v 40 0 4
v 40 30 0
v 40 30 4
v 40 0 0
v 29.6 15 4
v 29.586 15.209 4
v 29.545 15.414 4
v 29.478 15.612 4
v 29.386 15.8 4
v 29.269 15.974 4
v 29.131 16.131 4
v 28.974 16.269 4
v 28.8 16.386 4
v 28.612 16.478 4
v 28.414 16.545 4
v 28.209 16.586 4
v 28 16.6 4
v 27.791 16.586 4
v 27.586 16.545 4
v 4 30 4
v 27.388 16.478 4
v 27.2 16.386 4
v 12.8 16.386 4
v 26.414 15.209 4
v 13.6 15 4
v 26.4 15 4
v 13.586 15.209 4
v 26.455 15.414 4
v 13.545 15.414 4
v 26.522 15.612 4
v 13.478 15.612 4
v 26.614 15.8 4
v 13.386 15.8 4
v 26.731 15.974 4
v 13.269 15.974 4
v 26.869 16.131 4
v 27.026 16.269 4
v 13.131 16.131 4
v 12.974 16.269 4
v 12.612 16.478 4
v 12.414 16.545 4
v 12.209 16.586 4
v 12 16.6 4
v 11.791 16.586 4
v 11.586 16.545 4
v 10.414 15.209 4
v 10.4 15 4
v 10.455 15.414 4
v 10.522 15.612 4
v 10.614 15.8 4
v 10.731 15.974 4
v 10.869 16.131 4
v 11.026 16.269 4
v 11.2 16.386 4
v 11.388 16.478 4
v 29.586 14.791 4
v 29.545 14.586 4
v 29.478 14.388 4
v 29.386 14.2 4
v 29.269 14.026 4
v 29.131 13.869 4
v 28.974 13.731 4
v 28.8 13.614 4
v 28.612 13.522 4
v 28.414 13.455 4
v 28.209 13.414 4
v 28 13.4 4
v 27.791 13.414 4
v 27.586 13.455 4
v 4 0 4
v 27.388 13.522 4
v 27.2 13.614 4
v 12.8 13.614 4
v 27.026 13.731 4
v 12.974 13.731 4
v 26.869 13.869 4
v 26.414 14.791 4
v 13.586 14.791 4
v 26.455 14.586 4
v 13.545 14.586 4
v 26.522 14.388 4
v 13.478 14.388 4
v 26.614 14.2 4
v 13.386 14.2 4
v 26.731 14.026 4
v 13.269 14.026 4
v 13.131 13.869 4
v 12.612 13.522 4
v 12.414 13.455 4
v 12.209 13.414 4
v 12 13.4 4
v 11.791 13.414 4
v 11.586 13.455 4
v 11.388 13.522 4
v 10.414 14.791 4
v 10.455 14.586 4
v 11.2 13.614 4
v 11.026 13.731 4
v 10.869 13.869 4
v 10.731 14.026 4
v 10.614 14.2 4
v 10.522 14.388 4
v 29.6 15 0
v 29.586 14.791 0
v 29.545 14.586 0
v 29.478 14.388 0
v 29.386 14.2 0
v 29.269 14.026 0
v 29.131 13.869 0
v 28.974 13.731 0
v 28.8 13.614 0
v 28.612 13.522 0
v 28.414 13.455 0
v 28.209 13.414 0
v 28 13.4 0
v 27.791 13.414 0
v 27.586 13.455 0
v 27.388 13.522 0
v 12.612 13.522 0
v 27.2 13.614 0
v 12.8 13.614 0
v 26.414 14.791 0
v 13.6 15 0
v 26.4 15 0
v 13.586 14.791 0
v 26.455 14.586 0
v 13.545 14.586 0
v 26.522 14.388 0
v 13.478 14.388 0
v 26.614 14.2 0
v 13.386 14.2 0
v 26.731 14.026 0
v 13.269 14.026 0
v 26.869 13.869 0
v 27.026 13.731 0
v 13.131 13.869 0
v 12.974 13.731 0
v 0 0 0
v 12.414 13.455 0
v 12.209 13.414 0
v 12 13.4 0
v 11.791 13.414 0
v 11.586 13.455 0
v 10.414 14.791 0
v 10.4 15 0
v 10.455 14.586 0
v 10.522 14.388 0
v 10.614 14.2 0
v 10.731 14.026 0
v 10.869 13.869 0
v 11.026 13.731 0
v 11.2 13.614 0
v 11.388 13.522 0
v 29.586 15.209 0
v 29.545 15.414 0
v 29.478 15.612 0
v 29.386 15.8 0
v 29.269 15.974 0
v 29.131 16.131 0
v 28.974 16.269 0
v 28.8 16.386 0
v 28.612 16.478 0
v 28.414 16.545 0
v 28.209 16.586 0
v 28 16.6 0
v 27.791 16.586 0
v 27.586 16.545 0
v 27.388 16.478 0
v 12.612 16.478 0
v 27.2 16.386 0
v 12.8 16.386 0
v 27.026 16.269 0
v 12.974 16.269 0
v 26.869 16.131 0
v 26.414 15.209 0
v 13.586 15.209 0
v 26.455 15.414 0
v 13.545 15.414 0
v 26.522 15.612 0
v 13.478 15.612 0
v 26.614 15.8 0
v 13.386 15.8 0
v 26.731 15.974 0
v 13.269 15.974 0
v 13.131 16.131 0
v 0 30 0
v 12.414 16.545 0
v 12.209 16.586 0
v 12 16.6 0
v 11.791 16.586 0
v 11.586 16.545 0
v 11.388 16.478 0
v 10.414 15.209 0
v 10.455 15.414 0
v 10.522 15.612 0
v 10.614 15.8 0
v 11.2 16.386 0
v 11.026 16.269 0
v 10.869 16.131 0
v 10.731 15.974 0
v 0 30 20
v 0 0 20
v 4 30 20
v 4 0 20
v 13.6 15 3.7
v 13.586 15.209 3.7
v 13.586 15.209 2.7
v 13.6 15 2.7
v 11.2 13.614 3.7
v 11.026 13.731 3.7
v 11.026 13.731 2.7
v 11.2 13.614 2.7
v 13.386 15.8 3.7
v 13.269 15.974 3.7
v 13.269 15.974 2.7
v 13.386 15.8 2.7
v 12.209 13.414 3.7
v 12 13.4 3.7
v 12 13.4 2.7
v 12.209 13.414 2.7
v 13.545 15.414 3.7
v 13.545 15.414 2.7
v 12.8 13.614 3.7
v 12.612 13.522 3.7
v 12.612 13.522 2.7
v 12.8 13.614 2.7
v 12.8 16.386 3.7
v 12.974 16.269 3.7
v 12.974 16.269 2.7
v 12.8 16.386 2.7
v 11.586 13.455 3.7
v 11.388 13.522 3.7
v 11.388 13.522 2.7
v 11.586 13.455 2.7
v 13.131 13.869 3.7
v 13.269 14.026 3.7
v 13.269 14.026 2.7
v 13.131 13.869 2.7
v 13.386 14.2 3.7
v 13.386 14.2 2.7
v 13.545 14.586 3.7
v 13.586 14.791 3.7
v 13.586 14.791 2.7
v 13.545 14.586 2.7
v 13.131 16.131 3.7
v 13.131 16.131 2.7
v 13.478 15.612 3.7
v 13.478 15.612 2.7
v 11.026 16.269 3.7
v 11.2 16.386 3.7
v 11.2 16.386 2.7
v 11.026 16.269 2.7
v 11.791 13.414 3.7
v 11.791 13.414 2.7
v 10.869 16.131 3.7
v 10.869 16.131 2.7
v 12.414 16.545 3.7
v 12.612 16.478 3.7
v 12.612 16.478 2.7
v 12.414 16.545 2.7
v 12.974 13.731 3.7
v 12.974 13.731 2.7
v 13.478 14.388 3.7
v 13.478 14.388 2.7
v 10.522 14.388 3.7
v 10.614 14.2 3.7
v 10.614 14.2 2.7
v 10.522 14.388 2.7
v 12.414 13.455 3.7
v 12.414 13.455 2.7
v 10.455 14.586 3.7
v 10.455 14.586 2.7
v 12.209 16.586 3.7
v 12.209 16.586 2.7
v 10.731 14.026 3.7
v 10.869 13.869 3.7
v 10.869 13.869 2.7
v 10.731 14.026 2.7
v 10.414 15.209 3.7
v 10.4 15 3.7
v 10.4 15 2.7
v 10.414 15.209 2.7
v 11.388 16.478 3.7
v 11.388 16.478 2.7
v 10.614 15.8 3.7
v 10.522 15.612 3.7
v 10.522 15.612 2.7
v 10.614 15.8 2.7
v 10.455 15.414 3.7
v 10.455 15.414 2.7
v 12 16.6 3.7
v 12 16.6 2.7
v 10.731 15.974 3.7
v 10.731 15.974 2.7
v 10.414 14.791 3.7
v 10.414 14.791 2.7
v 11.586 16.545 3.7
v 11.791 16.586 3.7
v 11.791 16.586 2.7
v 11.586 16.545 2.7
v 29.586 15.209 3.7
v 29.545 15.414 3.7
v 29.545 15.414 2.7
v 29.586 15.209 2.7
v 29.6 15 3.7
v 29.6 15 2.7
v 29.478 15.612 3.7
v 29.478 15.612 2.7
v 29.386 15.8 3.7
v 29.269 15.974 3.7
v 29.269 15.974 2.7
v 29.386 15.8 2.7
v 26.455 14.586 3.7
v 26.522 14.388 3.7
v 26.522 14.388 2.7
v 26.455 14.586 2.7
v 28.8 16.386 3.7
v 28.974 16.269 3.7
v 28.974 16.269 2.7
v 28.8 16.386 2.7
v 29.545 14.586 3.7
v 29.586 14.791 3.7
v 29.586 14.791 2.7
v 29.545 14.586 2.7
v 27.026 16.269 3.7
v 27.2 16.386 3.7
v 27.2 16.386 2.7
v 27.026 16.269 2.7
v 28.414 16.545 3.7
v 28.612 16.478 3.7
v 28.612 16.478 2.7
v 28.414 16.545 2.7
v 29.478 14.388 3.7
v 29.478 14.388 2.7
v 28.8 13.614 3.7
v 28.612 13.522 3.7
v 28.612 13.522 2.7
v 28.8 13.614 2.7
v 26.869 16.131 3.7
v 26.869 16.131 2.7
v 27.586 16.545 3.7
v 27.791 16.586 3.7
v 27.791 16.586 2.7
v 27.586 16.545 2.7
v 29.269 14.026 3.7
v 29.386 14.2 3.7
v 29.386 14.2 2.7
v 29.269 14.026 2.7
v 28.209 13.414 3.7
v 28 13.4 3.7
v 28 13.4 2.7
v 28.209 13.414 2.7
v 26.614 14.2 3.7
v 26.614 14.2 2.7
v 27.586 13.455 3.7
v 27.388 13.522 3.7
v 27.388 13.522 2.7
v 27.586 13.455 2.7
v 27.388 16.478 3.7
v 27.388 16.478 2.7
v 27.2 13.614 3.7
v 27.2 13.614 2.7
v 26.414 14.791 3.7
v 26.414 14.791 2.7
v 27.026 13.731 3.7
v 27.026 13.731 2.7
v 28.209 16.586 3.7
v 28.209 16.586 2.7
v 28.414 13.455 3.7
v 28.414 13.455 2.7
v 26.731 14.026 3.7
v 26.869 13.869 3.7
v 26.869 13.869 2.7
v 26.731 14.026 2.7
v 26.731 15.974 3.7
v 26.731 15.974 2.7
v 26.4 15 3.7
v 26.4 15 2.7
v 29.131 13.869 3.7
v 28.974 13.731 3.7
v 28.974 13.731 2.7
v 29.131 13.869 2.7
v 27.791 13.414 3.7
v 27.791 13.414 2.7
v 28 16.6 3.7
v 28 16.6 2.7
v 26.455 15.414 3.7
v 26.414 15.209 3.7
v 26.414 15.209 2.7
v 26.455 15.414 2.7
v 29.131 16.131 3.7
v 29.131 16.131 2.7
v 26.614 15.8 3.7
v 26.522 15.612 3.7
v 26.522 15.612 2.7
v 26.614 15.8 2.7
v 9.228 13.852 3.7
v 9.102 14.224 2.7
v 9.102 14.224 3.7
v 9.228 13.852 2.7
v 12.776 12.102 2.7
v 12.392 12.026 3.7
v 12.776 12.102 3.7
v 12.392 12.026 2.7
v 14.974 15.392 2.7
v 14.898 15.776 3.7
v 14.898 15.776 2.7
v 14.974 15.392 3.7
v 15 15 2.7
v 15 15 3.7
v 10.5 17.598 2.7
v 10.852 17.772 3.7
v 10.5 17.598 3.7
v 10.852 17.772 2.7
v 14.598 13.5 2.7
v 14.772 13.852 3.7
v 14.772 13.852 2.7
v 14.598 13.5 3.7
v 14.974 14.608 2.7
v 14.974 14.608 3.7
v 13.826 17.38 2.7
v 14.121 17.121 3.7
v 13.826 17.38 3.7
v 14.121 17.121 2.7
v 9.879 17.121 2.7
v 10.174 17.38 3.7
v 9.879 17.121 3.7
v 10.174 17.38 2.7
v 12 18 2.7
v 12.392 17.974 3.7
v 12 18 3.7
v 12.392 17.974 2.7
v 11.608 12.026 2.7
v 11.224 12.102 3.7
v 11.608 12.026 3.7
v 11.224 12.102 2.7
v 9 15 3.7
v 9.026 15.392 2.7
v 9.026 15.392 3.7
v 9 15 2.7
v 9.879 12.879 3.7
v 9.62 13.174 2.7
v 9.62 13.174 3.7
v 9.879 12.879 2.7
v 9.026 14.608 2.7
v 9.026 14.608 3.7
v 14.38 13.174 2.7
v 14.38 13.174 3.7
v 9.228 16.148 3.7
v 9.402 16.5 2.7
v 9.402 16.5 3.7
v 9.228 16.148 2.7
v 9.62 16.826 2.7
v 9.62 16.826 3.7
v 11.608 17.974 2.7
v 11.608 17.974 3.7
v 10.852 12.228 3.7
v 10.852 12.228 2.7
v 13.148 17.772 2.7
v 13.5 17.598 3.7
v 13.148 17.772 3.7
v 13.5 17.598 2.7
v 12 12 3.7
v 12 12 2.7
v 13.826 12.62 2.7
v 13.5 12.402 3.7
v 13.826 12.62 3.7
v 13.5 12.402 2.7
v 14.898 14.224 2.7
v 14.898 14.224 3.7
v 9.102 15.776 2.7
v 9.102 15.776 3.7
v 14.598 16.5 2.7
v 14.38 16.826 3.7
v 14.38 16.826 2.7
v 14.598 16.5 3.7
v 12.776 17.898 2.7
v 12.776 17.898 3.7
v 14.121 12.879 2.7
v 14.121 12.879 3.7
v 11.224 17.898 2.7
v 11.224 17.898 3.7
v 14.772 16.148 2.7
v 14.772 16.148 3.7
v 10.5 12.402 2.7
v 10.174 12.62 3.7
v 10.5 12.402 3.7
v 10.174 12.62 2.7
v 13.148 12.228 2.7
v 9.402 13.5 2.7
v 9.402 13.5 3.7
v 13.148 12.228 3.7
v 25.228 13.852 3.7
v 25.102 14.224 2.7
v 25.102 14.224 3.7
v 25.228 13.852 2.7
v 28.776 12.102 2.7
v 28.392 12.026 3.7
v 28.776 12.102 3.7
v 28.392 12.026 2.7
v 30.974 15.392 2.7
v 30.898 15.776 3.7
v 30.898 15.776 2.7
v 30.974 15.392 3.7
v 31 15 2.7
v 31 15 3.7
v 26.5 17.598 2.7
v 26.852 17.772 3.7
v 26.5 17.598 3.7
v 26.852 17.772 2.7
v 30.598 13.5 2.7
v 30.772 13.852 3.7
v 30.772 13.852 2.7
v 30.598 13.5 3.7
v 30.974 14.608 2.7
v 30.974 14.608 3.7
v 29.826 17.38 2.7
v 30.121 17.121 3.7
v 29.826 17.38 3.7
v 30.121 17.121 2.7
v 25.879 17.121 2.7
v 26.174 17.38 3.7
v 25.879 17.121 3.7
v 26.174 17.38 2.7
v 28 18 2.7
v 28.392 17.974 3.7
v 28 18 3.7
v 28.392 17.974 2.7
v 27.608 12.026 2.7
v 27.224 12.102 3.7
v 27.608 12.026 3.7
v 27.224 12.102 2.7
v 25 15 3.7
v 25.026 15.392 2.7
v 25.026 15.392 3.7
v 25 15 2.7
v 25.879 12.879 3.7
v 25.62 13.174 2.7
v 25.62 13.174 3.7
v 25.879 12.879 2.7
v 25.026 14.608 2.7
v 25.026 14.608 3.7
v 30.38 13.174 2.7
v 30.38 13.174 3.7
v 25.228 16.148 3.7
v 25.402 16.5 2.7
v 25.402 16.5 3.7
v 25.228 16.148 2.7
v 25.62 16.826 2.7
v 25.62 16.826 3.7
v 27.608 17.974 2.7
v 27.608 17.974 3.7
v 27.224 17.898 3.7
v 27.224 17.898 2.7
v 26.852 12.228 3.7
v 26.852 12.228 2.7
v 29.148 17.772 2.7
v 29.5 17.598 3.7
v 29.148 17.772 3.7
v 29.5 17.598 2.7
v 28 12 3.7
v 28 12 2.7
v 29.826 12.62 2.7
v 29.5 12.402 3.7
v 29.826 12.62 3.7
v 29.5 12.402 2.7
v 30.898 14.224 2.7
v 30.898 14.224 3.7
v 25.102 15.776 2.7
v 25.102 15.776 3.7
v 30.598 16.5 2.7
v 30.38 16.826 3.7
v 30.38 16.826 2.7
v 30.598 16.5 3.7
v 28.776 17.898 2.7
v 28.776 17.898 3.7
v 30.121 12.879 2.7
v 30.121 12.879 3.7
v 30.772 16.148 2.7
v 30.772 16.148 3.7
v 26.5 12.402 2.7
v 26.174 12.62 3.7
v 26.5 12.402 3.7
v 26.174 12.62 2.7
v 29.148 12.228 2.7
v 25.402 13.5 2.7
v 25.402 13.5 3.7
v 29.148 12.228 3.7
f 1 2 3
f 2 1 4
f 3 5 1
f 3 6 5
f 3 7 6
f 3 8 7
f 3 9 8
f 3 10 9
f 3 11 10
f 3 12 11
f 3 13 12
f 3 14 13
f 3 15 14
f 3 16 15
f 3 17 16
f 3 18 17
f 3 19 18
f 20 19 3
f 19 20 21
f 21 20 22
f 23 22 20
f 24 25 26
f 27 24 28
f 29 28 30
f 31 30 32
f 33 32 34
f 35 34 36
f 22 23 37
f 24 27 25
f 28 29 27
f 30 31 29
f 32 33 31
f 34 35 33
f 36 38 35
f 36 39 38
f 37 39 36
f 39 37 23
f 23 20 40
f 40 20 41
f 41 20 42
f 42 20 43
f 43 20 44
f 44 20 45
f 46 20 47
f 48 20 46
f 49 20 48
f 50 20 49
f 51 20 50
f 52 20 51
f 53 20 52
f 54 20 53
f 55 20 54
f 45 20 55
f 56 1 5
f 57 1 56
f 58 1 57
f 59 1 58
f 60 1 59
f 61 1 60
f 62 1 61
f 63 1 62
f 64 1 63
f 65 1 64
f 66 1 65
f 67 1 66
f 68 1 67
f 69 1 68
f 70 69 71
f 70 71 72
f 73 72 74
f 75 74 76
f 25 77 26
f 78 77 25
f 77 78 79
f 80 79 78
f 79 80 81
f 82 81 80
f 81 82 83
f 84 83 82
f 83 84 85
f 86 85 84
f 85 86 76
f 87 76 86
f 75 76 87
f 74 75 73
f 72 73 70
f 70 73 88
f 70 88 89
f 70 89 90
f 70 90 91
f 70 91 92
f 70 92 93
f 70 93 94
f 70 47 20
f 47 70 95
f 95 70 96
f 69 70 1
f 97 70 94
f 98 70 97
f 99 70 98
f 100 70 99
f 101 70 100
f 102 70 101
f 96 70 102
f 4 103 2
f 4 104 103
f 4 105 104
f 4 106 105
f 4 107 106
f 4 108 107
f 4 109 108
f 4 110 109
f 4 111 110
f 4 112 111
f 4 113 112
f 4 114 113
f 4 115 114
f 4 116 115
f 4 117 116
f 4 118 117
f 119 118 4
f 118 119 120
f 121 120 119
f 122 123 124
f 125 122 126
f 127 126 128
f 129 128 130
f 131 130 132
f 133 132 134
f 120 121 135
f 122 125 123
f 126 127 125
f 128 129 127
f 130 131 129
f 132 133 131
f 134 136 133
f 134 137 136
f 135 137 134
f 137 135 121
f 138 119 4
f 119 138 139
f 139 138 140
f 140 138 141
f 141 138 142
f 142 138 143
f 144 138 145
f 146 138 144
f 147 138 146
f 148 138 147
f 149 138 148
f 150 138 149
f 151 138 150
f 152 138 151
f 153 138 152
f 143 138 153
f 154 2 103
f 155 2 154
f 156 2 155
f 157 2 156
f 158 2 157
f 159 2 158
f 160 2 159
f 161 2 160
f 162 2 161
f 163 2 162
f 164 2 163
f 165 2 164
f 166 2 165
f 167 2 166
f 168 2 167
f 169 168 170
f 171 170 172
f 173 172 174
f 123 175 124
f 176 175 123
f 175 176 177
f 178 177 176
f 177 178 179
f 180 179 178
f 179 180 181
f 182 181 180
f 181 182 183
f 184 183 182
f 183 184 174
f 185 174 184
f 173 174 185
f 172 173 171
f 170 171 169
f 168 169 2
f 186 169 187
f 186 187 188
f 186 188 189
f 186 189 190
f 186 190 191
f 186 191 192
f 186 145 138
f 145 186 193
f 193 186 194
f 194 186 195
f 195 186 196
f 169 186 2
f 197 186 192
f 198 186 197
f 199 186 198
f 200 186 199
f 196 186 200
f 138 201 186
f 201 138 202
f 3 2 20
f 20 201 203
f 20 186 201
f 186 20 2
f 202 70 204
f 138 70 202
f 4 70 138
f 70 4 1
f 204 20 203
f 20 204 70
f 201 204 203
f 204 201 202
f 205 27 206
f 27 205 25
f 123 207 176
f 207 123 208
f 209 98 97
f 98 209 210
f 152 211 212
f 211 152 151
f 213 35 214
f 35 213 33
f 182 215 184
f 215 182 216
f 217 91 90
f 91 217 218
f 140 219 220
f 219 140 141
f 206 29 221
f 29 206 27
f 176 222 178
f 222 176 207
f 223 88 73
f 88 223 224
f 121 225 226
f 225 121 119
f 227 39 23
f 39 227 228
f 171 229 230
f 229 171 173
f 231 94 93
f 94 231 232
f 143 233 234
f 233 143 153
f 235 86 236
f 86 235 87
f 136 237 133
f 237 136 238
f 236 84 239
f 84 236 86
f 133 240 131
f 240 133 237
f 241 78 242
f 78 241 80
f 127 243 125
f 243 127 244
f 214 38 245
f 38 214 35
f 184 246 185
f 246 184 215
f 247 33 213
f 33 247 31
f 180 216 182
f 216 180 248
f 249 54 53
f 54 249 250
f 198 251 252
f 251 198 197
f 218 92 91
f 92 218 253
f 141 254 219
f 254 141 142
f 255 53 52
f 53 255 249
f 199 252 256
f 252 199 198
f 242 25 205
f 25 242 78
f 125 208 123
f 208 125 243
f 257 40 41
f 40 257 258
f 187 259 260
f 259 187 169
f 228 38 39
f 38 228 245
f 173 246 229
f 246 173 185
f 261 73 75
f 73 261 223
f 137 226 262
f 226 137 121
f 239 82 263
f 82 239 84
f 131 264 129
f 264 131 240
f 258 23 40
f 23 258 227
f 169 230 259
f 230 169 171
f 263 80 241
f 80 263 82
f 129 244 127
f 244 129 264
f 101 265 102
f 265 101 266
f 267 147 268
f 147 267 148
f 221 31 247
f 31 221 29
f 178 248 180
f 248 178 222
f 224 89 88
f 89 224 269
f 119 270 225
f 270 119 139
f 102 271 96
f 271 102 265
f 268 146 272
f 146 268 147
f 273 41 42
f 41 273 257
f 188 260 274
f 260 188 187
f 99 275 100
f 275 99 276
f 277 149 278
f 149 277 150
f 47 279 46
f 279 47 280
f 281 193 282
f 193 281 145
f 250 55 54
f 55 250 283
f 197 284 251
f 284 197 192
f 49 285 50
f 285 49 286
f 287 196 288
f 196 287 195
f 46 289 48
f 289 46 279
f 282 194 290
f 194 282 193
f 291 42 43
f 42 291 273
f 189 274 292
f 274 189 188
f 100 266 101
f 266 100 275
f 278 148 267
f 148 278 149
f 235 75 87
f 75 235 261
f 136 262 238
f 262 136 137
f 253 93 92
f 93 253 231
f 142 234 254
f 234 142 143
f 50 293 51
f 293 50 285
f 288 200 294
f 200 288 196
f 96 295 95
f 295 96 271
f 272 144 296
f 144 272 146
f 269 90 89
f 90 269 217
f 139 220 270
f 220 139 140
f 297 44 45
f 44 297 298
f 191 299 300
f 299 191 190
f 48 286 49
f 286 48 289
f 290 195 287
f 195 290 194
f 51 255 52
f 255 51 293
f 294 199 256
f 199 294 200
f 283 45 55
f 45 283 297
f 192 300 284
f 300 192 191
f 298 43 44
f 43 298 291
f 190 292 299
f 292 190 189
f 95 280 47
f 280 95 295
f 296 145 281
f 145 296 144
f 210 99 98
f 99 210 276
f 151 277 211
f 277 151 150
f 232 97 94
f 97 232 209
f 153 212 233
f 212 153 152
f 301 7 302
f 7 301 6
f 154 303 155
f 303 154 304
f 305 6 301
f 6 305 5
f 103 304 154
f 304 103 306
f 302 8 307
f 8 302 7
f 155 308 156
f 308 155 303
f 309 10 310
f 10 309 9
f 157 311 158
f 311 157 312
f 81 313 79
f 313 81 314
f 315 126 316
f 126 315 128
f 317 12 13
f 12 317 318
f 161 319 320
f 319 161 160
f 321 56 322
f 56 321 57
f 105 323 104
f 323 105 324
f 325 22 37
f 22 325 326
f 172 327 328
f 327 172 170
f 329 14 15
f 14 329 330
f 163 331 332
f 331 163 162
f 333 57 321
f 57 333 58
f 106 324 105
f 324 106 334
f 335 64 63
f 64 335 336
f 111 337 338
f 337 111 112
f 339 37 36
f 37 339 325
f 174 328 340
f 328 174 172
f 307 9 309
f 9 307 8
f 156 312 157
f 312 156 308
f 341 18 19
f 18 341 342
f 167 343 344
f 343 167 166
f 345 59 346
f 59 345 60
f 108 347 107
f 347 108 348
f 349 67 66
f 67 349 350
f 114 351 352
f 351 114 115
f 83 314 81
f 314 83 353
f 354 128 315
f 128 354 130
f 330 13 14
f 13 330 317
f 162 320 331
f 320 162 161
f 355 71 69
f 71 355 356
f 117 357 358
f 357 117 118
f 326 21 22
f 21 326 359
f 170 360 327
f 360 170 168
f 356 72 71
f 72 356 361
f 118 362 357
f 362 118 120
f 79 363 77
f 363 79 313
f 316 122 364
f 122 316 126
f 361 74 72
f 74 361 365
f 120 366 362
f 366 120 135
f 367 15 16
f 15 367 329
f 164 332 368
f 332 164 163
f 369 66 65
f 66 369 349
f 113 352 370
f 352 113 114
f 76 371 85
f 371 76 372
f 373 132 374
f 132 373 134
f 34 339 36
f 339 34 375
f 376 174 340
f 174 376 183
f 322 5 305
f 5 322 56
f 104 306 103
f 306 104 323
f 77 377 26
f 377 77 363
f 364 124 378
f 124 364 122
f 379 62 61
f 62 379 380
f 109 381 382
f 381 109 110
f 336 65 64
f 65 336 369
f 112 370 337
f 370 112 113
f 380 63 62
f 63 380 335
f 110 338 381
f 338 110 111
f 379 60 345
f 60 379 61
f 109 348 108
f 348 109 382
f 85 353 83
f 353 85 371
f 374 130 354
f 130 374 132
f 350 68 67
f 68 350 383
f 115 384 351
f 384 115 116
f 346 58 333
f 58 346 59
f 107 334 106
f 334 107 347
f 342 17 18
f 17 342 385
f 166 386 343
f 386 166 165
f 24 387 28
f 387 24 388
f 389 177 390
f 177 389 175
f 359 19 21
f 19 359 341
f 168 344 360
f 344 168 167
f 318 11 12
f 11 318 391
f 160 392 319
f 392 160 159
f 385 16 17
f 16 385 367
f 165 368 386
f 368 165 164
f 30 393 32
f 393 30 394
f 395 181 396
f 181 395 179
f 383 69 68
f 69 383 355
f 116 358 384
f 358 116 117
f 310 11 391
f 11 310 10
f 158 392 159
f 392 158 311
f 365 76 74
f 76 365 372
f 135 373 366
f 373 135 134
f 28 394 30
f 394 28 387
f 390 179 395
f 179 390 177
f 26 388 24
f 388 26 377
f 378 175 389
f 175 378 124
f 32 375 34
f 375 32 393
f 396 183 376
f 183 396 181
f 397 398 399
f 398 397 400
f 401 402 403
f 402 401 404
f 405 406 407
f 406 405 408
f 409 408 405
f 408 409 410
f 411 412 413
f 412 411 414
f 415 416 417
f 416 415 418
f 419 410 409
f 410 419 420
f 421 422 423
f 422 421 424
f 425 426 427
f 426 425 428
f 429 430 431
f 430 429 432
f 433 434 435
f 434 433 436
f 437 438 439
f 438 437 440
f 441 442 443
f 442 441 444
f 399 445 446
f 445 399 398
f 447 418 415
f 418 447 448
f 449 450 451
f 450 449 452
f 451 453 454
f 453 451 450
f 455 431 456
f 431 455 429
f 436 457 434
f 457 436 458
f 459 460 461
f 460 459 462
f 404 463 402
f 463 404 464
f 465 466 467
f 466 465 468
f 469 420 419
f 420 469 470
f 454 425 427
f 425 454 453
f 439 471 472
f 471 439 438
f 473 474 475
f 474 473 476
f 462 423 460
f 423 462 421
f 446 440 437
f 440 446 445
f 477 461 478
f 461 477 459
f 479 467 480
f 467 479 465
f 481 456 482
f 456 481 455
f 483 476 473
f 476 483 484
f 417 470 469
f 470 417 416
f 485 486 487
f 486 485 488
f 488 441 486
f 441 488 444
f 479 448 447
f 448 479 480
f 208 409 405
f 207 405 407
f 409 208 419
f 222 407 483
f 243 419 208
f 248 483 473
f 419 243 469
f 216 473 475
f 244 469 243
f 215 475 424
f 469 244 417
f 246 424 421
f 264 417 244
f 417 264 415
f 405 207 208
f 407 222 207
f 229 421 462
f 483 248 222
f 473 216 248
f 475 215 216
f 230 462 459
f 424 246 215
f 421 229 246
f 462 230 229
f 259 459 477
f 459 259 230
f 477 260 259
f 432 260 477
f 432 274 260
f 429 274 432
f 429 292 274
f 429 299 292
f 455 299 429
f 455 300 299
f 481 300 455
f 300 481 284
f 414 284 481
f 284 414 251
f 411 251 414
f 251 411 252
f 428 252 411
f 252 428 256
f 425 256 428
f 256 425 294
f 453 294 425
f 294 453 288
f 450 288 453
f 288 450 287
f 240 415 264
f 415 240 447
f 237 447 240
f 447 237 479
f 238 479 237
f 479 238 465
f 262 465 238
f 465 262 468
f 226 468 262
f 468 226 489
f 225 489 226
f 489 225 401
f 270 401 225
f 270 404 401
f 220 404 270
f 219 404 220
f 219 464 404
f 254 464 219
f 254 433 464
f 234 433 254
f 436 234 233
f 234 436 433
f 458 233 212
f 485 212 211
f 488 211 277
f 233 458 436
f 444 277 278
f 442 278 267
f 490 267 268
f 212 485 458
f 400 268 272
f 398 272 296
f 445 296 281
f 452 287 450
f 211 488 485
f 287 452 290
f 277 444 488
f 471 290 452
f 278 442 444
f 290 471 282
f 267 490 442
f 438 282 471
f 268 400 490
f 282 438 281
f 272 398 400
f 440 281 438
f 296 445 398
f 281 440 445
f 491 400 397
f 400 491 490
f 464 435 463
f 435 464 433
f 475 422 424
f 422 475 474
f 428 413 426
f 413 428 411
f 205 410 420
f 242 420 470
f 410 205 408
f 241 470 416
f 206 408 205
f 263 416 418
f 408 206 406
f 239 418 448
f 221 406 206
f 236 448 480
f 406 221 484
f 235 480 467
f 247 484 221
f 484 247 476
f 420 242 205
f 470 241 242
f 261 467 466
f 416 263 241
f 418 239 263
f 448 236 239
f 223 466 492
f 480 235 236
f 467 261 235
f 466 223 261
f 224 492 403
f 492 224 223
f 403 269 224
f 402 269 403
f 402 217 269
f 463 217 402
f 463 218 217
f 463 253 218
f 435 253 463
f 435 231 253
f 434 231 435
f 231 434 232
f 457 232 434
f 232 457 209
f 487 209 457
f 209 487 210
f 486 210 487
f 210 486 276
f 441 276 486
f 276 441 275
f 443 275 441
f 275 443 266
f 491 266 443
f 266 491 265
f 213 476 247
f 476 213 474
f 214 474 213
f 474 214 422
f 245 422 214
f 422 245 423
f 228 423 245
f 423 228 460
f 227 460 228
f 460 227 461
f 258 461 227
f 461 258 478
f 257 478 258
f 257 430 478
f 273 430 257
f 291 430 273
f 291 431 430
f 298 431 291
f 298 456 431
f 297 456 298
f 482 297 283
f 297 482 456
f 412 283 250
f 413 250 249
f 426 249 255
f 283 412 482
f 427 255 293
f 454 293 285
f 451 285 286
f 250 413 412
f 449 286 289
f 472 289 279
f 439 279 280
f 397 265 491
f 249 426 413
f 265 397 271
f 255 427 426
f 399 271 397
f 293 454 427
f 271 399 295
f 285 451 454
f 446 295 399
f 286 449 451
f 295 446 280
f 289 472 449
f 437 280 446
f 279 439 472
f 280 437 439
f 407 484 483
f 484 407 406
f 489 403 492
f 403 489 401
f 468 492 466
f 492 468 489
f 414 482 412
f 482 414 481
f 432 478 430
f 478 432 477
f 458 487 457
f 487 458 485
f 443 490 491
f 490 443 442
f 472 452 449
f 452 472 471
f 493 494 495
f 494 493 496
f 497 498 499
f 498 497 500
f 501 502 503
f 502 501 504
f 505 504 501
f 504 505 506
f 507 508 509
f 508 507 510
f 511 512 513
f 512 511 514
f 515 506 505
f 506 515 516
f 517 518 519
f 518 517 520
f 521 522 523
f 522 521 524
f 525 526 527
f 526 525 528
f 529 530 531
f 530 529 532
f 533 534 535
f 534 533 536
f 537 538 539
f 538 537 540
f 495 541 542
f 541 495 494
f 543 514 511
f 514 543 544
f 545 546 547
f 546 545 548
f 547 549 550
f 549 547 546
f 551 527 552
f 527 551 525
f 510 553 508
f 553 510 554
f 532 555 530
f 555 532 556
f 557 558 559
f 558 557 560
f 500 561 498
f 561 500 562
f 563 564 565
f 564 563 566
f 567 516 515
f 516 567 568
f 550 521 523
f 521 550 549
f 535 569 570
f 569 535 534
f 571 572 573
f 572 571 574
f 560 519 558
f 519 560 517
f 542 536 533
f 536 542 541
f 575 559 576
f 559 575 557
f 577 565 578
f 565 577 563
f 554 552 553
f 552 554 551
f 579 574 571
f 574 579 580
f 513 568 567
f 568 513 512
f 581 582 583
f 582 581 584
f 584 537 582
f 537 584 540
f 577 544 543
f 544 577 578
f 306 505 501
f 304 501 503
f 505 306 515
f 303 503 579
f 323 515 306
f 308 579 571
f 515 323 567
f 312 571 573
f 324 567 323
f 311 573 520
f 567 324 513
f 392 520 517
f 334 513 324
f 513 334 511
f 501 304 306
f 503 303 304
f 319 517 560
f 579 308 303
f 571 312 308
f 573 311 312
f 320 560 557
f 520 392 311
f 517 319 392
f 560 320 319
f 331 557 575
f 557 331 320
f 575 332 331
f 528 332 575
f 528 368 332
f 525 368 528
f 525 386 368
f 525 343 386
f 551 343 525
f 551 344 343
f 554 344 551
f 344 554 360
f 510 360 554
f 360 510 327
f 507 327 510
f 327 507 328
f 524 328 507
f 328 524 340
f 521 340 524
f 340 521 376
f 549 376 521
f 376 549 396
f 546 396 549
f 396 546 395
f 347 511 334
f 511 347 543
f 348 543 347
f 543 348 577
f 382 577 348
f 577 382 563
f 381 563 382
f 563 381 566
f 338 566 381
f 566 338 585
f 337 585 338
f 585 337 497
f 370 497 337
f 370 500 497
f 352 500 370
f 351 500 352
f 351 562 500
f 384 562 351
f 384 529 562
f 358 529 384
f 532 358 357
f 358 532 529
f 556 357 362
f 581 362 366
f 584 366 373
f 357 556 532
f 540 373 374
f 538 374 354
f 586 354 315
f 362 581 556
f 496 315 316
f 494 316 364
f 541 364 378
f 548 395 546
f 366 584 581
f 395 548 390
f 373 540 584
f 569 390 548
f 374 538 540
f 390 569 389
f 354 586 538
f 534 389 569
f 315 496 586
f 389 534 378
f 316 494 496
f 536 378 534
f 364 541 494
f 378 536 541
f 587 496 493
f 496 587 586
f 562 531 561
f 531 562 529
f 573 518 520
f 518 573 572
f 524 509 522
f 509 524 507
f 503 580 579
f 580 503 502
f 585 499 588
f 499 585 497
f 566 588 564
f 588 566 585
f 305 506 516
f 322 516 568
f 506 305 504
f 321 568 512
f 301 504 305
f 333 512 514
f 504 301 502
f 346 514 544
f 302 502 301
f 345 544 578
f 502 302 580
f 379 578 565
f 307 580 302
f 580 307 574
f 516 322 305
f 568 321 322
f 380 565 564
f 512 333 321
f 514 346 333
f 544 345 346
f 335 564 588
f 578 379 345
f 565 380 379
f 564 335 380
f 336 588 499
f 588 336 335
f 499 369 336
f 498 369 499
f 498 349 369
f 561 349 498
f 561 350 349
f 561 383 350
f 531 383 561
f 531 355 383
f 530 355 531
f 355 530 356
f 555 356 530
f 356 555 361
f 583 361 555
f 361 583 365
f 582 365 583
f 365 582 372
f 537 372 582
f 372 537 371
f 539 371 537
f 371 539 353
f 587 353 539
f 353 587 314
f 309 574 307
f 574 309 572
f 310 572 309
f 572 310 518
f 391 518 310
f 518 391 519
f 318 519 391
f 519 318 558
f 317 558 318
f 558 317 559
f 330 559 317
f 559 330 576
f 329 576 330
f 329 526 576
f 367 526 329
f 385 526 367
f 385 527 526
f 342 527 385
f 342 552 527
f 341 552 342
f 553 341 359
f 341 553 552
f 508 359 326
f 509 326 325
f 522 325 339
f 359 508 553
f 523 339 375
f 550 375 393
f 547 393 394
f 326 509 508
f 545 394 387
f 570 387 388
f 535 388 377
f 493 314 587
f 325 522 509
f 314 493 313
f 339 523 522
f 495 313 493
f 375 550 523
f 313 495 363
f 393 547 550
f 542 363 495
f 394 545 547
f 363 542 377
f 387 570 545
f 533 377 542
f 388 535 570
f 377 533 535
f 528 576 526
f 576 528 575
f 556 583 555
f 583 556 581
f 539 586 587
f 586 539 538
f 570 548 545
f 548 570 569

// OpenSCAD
// L-shaped mounting bracket, 40x30x20mm, two M3 screw holes.
$fn = 48;

module m3_hole(h = 20) {
    cylinder(h = h, r = 1.6, center = true);
}

module bracket() {
    difference() {
        // Base L-body: two overlapping prisms forming an L.
        union() {
            translate([0, 0, 0])
                cube([40, 30, 4], center = false);     // horizontal floor
            translate([0, 0, 4])
                cube([4, 30, 16], center = false);        // vertical wall
        }
        // Two M3 through-holes in the long arm.
        translate([12, 15, 0]) m3_hole(h = 8);
        translate([28, 15, 0]) m3_hole(h = 8);
        // Countersinks on top of the floor.
        translate([12, 15, 3.2]) cylinder(h = 1, r = 3.0, center = true);
        translate([28, 15, 3.2]) cylinder(h = 1, r = 3.0, center = true);
    }
}

bracket();
